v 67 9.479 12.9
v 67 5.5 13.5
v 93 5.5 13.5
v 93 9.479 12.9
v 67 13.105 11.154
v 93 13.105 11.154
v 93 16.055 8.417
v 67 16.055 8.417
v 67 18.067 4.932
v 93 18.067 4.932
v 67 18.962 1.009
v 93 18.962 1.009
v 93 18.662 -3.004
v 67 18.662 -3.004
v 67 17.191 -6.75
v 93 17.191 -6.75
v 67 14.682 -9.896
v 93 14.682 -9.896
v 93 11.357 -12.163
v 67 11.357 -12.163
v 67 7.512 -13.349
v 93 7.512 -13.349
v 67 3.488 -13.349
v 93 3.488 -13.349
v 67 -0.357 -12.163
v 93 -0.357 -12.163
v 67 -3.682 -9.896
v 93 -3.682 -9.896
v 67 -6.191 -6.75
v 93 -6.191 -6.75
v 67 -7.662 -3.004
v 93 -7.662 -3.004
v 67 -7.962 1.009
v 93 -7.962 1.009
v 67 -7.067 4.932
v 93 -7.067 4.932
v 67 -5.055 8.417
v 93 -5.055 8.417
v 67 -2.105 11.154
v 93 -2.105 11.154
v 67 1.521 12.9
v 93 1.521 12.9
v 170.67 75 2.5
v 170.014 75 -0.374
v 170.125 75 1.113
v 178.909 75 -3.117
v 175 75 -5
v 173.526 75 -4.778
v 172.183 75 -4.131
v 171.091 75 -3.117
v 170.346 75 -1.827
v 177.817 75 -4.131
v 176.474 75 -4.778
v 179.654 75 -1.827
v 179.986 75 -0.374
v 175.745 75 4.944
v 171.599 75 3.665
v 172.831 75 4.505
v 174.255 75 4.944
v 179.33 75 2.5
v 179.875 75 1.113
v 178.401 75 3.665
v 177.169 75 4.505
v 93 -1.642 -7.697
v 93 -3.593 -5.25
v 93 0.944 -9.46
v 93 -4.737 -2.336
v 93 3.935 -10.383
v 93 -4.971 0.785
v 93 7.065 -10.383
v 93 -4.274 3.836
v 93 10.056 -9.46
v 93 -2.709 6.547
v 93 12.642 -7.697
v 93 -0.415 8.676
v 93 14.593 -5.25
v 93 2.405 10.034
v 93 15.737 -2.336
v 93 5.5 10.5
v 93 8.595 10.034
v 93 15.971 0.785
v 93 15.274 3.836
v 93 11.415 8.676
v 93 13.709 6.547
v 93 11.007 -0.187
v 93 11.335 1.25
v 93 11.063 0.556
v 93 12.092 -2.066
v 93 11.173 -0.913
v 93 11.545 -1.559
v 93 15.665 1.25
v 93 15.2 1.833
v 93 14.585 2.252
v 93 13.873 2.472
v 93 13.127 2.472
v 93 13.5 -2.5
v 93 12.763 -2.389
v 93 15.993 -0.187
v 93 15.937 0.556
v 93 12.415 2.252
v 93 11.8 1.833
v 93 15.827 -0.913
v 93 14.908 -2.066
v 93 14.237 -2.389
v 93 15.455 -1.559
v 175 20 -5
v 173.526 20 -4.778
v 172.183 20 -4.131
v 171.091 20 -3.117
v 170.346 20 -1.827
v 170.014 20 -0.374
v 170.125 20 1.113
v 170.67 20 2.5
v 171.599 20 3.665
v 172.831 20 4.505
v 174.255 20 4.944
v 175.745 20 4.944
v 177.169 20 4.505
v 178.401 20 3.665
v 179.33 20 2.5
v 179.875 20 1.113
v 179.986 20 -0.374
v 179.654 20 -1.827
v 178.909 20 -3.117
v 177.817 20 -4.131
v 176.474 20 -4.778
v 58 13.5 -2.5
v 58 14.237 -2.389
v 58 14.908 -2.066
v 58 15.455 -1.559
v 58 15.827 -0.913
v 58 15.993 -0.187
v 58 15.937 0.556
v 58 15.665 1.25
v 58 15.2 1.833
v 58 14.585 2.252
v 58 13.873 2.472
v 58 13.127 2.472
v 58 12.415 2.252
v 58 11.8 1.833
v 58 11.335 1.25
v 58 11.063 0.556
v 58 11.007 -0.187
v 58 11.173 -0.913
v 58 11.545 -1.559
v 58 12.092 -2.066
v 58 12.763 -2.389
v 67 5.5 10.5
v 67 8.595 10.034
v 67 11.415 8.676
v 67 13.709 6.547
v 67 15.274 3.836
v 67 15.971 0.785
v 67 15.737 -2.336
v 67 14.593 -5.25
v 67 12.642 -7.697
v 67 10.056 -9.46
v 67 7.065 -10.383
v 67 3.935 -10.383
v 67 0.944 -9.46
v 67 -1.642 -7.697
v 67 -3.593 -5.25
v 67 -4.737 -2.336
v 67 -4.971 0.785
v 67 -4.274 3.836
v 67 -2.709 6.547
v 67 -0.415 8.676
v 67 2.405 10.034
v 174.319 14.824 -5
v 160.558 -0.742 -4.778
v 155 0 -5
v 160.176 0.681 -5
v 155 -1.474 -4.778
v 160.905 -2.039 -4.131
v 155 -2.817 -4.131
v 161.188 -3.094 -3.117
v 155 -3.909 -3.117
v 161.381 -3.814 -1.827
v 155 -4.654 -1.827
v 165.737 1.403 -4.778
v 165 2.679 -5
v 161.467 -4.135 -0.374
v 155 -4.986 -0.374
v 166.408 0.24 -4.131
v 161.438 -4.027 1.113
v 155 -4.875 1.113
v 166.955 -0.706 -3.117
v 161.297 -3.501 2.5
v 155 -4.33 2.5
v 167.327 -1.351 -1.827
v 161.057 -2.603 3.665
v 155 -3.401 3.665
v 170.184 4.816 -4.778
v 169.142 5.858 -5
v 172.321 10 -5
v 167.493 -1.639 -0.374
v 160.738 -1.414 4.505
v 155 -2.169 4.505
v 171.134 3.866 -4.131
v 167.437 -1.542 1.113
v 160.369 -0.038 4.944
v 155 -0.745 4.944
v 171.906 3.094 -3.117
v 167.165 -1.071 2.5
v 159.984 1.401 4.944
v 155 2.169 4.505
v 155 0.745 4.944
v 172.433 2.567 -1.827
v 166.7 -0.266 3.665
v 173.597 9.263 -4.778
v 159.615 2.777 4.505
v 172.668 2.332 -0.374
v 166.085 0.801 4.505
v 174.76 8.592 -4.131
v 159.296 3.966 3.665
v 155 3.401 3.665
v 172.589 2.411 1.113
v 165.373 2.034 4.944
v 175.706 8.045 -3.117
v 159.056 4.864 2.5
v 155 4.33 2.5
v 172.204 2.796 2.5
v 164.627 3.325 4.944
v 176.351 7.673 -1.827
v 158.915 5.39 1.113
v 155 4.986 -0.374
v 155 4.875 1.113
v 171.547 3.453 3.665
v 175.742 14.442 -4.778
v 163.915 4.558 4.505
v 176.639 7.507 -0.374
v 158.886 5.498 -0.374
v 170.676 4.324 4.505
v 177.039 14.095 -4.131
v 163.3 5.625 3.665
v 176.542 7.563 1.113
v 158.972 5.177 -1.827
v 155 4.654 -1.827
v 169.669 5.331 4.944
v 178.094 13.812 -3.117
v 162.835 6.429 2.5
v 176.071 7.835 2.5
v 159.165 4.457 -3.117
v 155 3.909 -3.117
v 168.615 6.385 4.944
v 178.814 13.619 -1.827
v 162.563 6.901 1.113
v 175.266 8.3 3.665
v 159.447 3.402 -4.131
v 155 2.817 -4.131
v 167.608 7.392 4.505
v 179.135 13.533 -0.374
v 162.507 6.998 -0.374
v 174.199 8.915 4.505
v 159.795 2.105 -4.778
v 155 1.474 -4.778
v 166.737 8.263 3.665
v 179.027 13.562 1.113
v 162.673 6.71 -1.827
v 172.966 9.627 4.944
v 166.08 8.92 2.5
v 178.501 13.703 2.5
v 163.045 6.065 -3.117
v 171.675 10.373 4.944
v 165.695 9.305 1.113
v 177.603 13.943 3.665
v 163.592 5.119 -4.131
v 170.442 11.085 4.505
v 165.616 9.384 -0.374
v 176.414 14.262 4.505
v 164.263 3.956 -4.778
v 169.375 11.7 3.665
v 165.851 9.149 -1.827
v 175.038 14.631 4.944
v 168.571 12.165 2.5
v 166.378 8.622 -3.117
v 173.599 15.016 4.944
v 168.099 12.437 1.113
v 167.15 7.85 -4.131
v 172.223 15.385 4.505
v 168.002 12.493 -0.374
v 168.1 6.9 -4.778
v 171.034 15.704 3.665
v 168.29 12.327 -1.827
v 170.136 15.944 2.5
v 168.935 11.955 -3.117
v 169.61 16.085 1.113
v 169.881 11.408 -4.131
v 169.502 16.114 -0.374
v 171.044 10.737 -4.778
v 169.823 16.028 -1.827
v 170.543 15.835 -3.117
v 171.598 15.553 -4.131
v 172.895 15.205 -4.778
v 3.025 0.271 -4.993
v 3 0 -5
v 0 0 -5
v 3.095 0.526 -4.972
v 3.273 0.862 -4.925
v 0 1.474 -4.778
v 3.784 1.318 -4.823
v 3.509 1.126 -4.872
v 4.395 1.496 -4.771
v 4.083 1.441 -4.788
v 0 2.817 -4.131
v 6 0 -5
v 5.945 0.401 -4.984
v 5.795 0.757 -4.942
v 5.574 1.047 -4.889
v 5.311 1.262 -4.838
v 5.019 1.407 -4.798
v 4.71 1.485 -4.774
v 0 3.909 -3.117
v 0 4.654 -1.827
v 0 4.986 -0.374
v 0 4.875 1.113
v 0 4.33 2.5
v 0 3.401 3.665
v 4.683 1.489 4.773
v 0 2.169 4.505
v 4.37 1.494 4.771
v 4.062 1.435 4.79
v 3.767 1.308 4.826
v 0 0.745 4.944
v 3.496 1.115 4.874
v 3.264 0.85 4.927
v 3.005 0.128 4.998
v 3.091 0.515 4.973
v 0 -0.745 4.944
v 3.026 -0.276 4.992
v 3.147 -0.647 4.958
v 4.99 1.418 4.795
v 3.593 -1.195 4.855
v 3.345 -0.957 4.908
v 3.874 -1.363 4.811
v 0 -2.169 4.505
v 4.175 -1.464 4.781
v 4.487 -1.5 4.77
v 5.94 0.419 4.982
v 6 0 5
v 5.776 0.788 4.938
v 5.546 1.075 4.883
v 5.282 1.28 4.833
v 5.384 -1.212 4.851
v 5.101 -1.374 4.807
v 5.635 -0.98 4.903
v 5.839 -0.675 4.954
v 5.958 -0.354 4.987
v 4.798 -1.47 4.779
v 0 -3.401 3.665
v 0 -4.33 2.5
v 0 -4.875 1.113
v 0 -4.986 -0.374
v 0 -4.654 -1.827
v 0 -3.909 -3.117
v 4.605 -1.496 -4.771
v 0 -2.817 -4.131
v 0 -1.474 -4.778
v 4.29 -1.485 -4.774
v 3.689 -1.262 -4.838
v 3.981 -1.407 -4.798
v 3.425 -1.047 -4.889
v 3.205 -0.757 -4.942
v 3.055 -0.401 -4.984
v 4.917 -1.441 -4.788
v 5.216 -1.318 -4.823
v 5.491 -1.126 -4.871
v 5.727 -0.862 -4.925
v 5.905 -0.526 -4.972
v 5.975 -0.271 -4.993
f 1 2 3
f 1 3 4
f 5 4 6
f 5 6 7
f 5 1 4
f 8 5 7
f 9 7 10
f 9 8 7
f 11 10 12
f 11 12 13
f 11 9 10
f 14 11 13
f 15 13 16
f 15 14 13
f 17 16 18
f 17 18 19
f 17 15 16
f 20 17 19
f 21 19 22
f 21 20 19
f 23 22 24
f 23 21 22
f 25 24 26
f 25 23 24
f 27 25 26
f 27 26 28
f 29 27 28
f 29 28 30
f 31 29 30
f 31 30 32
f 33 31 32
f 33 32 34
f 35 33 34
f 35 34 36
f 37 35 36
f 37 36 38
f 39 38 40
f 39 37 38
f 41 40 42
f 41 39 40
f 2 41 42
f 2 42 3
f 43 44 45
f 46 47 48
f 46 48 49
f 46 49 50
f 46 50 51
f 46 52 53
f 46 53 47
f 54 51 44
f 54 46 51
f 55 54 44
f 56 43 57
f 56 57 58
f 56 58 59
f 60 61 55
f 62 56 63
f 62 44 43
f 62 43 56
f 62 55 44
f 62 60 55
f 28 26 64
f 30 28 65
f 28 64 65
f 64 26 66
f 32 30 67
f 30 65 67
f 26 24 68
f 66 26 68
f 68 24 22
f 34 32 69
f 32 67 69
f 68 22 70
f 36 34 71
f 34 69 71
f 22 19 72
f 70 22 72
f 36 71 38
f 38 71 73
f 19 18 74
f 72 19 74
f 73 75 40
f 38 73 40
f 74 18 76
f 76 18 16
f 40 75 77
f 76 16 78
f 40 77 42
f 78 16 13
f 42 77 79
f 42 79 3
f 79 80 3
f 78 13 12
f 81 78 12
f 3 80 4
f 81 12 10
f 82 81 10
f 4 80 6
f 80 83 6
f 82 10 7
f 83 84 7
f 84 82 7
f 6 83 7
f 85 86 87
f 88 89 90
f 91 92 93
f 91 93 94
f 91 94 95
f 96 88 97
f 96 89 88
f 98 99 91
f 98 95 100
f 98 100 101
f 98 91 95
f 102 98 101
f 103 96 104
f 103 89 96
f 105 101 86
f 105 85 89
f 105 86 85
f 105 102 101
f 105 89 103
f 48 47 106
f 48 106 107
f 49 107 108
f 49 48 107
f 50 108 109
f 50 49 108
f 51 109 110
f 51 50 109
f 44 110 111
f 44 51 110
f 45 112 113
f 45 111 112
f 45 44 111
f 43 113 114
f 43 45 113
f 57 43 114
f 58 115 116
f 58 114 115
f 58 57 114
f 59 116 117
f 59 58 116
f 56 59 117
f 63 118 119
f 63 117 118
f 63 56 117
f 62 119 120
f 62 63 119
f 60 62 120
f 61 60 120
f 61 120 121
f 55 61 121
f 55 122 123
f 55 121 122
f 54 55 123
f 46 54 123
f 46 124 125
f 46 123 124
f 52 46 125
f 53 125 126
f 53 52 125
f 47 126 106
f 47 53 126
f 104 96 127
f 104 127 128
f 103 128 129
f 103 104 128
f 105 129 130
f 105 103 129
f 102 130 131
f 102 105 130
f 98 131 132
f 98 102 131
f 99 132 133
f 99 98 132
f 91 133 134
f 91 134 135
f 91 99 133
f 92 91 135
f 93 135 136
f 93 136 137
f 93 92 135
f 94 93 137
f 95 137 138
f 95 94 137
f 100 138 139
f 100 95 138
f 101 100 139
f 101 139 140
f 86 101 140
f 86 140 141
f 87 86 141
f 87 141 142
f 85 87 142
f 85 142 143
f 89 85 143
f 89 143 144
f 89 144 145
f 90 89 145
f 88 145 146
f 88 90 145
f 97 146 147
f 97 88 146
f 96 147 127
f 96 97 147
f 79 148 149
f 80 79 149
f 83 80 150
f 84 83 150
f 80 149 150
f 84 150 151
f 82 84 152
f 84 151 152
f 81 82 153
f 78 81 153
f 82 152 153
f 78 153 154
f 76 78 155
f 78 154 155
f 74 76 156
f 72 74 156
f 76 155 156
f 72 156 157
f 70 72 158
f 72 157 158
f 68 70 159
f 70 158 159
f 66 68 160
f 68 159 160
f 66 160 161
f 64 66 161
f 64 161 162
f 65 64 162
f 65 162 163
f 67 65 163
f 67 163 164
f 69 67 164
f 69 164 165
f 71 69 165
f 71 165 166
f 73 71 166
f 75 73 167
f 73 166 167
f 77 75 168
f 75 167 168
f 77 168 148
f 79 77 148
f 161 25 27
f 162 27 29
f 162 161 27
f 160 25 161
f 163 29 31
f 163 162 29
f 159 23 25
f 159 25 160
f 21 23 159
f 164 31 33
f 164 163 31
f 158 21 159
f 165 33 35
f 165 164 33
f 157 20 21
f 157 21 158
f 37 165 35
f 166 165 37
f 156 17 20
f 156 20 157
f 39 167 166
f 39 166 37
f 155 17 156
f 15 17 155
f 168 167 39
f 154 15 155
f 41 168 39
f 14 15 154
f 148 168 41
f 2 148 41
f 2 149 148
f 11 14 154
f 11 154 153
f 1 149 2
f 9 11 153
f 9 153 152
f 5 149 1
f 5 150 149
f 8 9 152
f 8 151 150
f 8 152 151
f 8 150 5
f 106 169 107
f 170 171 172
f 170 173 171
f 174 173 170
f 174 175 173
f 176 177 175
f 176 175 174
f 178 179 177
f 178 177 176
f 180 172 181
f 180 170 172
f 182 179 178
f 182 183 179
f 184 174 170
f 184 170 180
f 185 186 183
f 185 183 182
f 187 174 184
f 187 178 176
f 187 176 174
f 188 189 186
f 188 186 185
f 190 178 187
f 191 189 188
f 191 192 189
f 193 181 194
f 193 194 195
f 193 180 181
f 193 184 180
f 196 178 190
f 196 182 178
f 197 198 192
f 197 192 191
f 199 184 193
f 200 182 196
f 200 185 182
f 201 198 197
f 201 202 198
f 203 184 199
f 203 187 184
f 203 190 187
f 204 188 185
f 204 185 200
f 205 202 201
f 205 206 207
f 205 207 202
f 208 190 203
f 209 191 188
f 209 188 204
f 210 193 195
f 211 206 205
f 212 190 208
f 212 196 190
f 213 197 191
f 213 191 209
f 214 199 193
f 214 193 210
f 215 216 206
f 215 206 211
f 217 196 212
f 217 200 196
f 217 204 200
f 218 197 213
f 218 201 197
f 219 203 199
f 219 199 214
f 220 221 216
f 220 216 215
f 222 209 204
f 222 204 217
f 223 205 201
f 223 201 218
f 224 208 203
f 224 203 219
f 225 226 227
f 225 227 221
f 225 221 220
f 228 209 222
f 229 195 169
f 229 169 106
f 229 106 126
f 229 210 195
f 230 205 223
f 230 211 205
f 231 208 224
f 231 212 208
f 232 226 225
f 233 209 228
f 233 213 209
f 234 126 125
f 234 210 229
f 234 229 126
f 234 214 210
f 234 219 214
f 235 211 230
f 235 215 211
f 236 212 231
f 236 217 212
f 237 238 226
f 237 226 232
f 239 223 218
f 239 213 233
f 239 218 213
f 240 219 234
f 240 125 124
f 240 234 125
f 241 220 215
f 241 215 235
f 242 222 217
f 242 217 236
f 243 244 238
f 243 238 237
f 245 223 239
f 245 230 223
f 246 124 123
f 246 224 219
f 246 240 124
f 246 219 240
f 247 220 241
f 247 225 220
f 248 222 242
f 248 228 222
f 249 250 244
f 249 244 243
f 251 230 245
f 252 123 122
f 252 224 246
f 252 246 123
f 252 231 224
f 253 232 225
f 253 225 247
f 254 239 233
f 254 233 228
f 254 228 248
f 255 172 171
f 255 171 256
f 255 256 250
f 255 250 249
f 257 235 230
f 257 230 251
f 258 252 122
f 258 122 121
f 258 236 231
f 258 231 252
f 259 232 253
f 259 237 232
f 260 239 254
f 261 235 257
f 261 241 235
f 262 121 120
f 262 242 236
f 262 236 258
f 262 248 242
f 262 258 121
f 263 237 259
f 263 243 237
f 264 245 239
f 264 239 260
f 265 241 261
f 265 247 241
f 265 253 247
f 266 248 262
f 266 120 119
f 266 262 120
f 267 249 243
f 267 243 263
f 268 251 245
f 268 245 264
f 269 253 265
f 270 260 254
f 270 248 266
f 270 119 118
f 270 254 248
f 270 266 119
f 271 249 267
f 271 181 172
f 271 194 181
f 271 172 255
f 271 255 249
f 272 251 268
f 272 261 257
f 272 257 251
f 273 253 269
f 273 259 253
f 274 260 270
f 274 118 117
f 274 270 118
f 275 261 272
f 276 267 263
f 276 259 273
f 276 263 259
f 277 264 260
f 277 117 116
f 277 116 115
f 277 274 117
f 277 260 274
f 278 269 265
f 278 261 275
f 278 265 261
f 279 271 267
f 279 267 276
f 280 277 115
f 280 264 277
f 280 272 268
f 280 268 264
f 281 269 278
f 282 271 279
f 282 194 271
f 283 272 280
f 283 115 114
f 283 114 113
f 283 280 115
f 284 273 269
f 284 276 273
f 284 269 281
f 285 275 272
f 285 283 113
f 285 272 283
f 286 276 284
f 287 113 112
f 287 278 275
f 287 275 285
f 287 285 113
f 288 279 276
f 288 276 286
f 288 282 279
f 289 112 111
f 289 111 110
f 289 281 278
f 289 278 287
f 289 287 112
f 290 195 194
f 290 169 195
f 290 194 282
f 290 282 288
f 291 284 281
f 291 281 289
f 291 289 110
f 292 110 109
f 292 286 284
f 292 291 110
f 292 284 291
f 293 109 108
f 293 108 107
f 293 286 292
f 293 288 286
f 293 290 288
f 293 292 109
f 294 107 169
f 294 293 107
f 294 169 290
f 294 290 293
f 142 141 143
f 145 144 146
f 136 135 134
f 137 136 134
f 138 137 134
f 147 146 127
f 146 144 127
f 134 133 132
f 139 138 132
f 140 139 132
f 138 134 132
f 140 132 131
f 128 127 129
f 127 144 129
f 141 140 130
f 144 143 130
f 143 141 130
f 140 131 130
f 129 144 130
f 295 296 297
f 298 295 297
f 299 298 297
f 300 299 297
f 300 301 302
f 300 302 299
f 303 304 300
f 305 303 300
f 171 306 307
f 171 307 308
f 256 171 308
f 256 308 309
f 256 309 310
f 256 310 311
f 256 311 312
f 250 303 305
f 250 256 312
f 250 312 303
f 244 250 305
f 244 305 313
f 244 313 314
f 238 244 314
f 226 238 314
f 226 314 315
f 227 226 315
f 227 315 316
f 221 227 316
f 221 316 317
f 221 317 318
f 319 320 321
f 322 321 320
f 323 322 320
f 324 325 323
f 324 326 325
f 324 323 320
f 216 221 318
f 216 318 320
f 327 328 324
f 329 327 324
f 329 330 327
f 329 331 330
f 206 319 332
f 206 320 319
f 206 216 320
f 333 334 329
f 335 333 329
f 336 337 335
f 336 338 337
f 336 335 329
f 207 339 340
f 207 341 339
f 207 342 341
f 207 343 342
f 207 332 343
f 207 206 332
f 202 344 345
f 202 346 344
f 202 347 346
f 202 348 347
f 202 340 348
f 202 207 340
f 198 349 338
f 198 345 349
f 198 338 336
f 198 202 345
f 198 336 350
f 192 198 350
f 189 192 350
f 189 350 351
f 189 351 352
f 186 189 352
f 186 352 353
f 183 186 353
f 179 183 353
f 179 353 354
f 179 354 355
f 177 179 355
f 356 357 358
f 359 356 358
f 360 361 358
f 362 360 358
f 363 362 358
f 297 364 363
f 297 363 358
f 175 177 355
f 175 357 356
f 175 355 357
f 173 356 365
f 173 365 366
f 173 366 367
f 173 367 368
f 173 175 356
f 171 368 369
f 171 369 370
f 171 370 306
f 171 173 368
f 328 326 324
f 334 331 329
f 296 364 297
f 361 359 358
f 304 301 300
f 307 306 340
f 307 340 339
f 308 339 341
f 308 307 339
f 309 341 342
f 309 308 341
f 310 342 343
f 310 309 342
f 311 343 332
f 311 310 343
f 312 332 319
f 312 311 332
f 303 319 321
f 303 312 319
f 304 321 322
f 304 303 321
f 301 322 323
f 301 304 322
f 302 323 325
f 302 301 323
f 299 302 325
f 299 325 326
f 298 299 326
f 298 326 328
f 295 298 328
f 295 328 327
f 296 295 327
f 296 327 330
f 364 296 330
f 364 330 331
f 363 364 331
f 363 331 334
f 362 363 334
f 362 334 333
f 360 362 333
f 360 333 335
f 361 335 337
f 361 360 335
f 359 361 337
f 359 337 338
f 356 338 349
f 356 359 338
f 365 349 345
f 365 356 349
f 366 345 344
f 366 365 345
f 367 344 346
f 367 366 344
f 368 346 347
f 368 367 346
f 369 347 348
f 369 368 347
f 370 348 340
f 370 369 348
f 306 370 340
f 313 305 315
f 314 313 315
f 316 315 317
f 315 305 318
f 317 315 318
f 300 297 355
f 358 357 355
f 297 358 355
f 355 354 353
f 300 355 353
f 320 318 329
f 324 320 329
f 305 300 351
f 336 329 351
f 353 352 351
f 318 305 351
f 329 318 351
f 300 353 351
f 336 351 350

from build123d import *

# Parameters (mm, degrees)
SKETCH_2_R               = 5
CUT_EXTRUDE_1_DEPTH      = 196.064092126
CUT_EXTRUDE_1_DEPTH_BACK = 196.064092126
SKETCH_3_R               = 1.5
SKETCH_4_R               = 13.5
SKETCH_4_R_2             = 10.5
EXTRUDE_1_DEPTH          = 26
SKETCH_5_R               = 2.5
EXTRUDE_2_DEPTH          = 35


with BuildPart() as part:
    # По траектории1: sweep along a path in Эскиз1
    with BuildLine(Plane.XY) as sweep_1_path:
        Line((0, 0), (155, 0))
        ThreePointArc((155, 0), (169.142135624, 5.857864376), (175, 20))
        Line((175, 20), (175, 75))
    # Эскиз2 → По траектории1 (sweep)
    with BuildSketch(Plane(origin=(0, 0, 0), x_dir=(0, 0, -1), z_dir=(1, 0, 0))):
        Circle(SKETCH_2_R)
    sweep(path=sweep_1_path.line)

    # Эскиз3 → Вырез-Вытянуть1 (cut, two sides: drawn at the far end of the back side and taken through both)
    with BuildSketch(Plane.XY.offset(-CUT_EXTRUDE_1_DEPTH_BACK)):
        with Locations((4.5, 0)):
            Circle(SKETCH_3_R)
    extrude(amount=CUT_EXTRUDE_1_DEPTH + CUT_EXTRUDE_1_DEPTH_BACK, mode=Mode.SUBTRACT)


with BuildPart() as body_2:
    # Эскиз4 → Бобышка-Вытянуть1 (new body)
    with BuildSketch(Plane.ZY.offset(-67)):
        with Locations((0, 5.5)):
            Circle(SKETCH_4_R)
        with Locations((0, 5.5)):
            Circle(SKETCH_4_R_2, mode=Mode.SUBTRACT)
    extrude(amount=-EXTRUDE_1_DEPTH)


with BuildPart() as body_3:
    # Эскиз5 → Бобышка-Вытянуть2 (new body)
    with BuildSketch(Plane(origin=(93, 0, 0), x_dir=(0, 0, -1), z_dir=(1, 0, 0))):
        with Locations((0, 13.5)):
            Circle(SKETCH_5_R)
    extrude(amount=-EXTRUDE_2_DEPTH)


solid = Compound([part.part, body_2.part, body_3.part])
